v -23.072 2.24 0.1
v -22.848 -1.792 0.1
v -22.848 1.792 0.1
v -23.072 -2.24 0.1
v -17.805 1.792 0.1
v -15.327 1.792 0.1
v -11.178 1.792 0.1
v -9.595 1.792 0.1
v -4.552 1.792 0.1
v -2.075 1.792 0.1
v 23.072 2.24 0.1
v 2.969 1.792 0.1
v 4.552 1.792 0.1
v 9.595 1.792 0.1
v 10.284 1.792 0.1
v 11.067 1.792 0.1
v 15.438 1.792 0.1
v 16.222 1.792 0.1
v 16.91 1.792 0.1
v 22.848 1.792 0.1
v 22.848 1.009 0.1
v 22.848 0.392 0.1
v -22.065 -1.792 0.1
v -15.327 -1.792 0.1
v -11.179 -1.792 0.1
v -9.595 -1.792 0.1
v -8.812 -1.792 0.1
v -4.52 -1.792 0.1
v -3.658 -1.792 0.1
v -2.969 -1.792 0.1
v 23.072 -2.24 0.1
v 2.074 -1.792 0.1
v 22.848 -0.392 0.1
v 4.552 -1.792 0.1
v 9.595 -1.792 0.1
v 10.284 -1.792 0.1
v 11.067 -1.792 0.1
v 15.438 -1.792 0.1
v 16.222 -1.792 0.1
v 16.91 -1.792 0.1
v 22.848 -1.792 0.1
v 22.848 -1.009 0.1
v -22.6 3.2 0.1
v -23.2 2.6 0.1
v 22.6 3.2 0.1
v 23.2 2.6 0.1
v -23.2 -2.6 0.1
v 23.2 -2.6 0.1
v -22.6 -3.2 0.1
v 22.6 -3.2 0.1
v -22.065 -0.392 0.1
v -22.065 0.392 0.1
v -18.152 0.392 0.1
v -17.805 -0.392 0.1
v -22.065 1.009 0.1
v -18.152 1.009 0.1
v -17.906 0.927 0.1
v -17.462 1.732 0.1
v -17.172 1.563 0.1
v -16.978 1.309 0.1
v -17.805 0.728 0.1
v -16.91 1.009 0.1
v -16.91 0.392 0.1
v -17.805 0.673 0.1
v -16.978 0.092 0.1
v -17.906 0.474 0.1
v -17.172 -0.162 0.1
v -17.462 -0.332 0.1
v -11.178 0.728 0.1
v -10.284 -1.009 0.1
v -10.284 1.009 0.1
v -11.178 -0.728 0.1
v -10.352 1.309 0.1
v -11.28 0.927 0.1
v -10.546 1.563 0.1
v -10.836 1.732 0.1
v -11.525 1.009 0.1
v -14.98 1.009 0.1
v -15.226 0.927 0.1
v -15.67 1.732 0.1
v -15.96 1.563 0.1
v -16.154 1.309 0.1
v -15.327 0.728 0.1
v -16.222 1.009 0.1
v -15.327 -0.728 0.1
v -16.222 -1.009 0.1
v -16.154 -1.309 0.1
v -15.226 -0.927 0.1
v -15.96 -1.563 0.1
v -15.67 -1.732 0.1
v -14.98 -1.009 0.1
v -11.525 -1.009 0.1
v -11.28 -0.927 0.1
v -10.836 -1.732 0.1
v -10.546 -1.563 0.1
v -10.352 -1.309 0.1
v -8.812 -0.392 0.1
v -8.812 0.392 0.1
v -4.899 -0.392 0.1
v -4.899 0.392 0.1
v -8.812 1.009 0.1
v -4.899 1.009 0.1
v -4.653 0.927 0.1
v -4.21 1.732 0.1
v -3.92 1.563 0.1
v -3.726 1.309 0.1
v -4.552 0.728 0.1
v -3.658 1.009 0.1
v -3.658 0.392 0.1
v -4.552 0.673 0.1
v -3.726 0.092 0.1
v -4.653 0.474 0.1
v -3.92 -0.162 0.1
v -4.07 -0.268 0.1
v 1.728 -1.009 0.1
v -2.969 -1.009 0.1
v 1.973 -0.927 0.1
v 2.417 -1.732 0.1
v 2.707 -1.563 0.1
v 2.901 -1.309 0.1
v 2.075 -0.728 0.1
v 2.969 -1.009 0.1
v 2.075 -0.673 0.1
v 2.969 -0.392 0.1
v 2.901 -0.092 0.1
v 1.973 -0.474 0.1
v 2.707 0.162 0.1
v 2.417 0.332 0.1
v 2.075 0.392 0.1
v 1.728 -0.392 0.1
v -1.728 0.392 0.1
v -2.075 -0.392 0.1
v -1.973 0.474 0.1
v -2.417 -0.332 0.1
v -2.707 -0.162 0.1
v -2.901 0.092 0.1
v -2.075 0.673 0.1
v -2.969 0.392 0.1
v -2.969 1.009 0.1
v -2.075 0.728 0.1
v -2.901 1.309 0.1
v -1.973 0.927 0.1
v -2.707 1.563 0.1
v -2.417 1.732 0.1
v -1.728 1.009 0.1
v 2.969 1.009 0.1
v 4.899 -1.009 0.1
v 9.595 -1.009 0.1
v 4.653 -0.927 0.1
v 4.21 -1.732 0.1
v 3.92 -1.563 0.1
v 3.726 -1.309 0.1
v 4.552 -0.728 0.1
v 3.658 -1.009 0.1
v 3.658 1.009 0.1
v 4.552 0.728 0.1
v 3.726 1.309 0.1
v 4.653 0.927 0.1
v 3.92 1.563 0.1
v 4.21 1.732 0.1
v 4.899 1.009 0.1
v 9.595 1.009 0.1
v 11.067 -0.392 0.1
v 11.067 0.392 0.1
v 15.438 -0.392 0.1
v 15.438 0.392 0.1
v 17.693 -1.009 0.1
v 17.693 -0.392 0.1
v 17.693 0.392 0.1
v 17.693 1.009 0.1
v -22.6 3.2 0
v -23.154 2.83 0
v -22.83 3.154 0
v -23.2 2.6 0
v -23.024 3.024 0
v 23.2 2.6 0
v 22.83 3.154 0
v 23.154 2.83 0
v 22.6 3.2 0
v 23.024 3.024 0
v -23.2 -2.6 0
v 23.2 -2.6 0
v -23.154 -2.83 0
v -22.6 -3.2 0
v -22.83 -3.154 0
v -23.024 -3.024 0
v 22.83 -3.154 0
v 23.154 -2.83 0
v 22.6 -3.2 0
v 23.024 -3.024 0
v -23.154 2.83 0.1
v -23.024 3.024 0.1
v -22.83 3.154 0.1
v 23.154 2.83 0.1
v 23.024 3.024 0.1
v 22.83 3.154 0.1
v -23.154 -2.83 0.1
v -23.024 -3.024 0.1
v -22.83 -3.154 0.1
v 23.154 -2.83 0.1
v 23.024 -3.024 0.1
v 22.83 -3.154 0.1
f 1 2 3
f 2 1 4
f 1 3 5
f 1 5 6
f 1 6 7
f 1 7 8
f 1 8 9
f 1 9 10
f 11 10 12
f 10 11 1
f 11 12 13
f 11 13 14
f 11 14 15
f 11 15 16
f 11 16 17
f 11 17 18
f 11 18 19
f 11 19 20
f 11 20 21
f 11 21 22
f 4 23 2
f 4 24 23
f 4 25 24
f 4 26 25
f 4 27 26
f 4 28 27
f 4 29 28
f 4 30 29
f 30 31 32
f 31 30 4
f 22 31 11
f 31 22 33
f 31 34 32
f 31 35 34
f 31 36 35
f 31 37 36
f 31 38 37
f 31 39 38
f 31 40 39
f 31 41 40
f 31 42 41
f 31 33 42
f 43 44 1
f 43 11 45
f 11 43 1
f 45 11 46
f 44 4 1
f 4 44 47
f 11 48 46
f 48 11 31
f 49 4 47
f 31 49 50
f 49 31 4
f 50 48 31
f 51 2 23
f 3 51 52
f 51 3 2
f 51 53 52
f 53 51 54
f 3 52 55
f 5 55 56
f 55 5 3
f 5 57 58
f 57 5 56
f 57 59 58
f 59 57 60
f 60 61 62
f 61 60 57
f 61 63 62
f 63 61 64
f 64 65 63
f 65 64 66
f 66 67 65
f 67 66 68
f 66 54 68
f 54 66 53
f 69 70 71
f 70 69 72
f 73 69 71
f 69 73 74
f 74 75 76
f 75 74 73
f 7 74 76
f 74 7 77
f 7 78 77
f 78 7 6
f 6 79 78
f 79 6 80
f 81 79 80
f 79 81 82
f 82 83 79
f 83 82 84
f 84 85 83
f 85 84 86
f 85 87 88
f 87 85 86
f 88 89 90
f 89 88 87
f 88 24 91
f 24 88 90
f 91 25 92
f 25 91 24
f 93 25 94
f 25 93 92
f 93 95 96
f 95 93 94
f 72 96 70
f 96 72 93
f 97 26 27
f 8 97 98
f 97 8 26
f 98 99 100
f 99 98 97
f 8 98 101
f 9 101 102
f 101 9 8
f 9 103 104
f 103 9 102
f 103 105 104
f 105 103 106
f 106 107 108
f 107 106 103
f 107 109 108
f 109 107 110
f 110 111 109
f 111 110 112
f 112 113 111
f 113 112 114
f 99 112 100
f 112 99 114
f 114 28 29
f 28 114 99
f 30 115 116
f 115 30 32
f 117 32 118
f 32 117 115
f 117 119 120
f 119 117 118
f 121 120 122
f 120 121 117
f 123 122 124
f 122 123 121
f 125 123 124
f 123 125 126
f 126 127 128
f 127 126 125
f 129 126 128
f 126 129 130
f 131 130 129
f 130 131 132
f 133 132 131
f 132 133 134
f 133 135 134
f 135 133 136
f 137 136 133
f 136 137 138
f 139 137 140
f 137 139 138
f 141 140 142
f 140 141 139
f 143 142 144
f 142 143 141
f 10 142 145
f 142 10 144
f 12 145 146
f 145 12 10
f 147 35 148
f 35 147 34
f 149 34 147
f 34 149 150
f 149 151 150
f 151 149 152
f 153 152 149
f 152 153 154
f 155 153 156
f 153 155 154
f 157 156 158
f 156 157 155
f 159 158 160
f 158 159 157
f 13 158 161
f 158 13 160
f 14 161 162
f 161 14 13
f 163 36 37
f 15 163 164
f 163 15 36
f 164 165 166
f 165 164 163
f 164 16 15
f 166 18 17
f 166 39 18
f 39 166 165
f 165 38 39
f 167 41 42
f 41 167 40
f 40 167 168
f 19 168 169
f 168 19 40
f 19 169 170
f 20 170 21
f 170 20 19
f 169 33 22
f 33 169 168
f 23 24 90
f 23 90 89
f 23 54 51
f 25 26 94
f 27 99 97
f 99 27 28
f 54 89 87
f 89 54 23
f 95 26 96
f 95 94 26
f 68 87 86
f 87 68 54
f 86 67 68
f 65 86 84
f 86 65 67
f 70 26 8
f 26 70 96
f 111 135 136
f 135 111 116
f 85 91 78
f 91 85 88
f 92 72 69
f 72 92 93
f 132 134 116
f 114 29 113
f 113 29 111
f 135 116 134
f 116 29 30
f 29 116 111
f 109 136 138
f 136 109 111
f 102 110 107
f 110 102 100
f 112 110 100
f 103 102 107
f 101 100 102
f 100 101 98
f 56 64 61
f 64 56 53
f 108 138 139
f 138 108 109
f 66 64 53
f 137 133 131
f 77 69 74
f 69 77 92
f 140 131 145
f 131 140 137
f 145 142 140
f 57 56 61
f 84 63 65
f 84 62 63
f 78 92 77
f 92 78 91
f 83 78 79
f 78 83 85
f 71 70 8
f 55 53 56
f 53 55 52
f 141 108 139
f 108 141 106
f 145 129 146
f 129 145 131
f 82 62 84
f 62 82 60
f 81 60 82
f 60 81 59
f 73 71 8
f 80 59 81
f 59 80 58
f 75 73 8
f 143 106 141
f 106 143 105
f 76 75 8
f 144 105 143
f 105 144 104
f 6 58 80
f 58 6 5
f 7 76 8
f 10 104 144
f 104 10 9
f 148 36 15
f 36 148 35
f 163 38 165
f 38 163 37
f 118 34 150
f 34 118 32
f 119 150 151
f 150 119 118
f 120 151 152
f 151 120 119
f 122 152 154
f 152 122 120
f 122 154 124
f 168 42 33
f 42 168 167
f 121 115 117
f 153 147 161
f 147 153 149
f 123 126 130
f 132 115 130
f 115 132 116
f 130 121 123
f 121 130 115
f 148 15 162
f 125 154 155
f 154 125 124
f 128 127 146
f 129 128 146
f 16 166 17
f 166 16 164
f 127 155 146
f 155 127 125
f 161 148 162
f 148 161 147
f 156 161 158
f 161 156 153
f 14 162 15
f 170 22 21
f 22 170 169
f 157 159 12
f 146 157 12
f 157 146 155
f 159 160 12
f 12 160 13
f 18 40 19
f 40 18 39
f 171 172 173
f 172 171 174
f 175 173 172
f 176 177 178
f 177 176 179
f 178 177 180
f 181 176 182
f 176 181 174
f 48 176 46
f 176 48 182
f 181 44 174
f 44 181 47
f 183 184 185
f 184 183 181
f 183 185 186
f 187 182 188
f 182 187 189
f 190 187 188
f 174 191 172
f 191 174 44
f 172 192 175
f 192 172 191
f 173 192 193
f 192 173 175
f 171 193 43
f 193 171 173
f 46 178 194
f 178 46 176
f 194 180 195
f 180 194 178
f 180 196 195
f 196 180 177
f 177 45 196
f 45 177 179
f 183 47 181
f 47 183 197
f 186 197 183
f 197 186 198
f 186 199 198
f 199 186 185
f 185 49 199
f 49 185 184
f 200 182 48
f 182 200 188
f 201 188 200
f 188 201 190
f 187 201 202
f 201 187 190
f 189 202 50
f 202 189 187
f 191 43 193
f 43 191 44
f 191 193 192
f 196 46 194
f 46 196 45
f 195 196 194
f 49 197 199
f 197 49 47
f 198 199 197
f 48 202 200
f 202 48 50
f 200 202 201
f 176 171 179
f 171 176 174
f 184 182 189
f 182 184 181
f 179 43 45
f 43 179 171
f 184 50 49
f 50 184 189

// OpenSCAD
// file: s/6148328ps02.scad
use <../../lib.scad>
function ldraw_lib__s__6148328ps02() = [
// 0 ~Sticker  0.8 x  5.8 with Red "PORSCHE" on Black Background - Complementary faces
// 0 Name: s\6148328ps02.dat
// 0 Author: Massimo Maso [Sirio]
// 0 !LDRAW_ORG Subpart UPDATE 2024-05
// 0 !LICENSE Licensed under CC BY 4.0 : see CAreadme.txt
// 
// 0 BFC CERTIFY CCW
  [0,"BFC","CERTIFY"],
  [0,"BFC","CCW"],
// 
// 0 !HISTORY 2024-06-30 [OrionP] Official Update 2024-05
// 
// 
// 0 // Faces
// 3 16 -56.5 0 8 -58 0 6.5 -57.68 0 5.6
  [3,16,-56.5,0,8,-58,0,6.5,-57.68,0,5.6],
// 4 16 -56.5 0 8 -57.68 0 5.6 57.68 0 5.6 56.5 0 8
  [4,16,-56.5,0,8,-57.68,0,5.6,57.68,0,5.6,56.5,0,8],
// 3 16 56.5 0 8 57.68 0 5.6 58 0 6.5
  [3,16,56.5,0,8,57.68,0,5.6,58,0,6.5],
// 4 16 -58 0 6.5 -58 0 -6.5 -57.68 0 -5.6 -57.68 0 5.6
  [4,16,-58,0,6.5,-58,0,-6.5,-57.68,0,-5.6,-57.68,0,5.6],
// 4 16 58 0 6.5 57.68 0 5.6 57.68 0 -5.6 58 0 -6.5
  [4,16,58,0,6.5,57.68,0,5.6,57.68,0,-5.6,58,0,-6.5],
// 3 16 -56.5 0 -8 -57.68 0 -5.6 -58 0 -6.5
  [3,16,-56.5,0,-8,-57.68,0,-5.6,-58,0,-6.5],
// 4 16 -56.5 0 -8 56.5 0 -8 57.68 0 -5.6 -57.68 0 -5.6
  [4,16,-56.5,0,-8,56.5,0,-8,57.68,0,-5.6,-57.68,0,-5.6],
// 3 16 56.5 0 -8 58 0 -6.5 57.68 0 -5.6
  [3,16,56.5,0,-8,58,0,-6.5,57.68,0,-5.6],
];
module ldraw_lib__s__6148328ps02(step=0, col=false, unit=2/5, alt=false, line=0.2, solid=!$preview)
    makepoly(ldraw_lib__s__6148328ps02(), step=step, col=col, unit=unit, alt=alt, line=line, solid=solid);
ldraw_lib__s__6148328ps02(line=0.2);
// file: s/6148328ps01.scad
use <../../lib.scad>
function ldraw_lib__s__6148328ps01() = [
// 0 ~Sticker  0.8 x  5.8 with Red "PORSCHE" on Black Background - Outerbox for Logo Unscaled
// 0 Name: s\6148328ps01.dat
// 0 Author: Massimo Maso [Sirio]
// 0 !LDRAW_ORG Subpart UPDATE 2024-08
// 0 !LICENSE Licensed under CC BY 4.0 : see CAreadme.txt
// 
// 0 BFC CERTIFY CCW
  [0,"BFC","CERTIFY"],
  [0,"BFC","CCW"],
// 
// 0 !HISTORY 2023-10-31 [OrionP] Official Update 2023-05
// 0 !HISTORY 2024-07-21 [Sirio] Modified for change of logo primitive
// 0 !HISTORY 2024-09-30 [OrionP] Official Update 2024-08
// 
// 0 // Outerbox
// 4 16 -51.5 0 5 -51.5 0 -5 -51 0 -4 -51 0 4
  [4,16,-51.5,0,5,-51.5,0,-5,-51,0,-4,-51,0,4],
// 3 16 -51.5 0 5 -51 0 4 -39.7424 0 4
  [3,16,-51.5,0,5,-51,0,4,-39.7424,0,4],
// 3 16 -51.5 0 5 -39.7424 0 4 -34.2129 0 4
  [3,16,-51.5,0,5,-39.7424,0,4,-34.2129,0,4],
// 3 16 -51.5 0 5 -34.2129 0 4 -24.9513 0 4
  [3,16,-51.5,0,5,-34.2129,0,4,-24.9513,0,4],
// 3 16 -51.5 0 5 -24.9513 0 4 -21.4179 0 4
  [3,16,-51.5,0,5,-24.9513,0,4,-21.4179,0,4],
// 3 16 -51.5 0 5 -21.4179 0 4 -10.1603 0 4
  [3,16,-51.5,0,5,-21.4179,0,4,-10.1603,0,4],
// 3 16 -51.5 0 5 -10.1603 0 4 -4.6308 0 4
  [3,16,-51.5,0,5,-10.1603,0,4,-4.6308,0,4],
// 4 16 -51.5 0 5 -4.6308 0 4 6.6268 0 4 51.5 0 5
  [4,16,-51.5,0,5,-4.6308,0,4,6.6268,0,4,51.5,0,5],
// 3 16 51.5 0 5 6.6268 0 4 10.1603 0 4
  [3,16,51.5,0,5,6.6268,0,4,10.1603,0,4],
// 3 16 51.5 0 5 10.1603 0 4 21.4179 0 4
  [3,16,51.5,0,5,10.1603,0,4,21.4179,0,4],
// 3 16 51.5 0 5 21.4179 0 4 22.9553 0 4
  [3,16,51.5,0,5,21.4179,0,4,22.9553,0,4],
// 3 16 51.5 0 5 22.9553 0 4 24.7033 0 4
  [3,16,51.5,0,5,22.9553,0,4,24.7033,0,4],
// 3 16 51.5 0 5 24.7033 0 4 34.4609 0 4
  [3,16,51.5,0,5,24.7033,0,4,34.4609,0,4],
// 3 16 51.5 0 5 34.4609 0 4 36.2089 0 4
  [3,16,51.5,0,5,34.4609,0,4,36.2089,0,4],
// 3 16 51.5 0 5 36.2089 0 4 37.7464 0 4
  [3,16,51.5,0,5,36.2089,0,4,37.7464,0,4],
// 3 16 51.5 0 5 37.7464 0 4 51 0 4
  [3,16,51.5,0,5,37.7464,0,4,51,0,4],
// 3 16 51.5 0 5 51 0 4 51 0 2.252
  [3,16,51.5,0,5,51,0,4,51,0,2.252],
// 3 16 51.5 0 5 51 0 2.252 51 0 .874
  [3,16,51.5,0,5,51,0,2.252,51,0,.874],
// 3 16 -51.5 0 -5 -49.252 0 -4 -51 0 -4
  [3,16,-51.5,0,-5,-49.252,0,-4,-51,0,-4],
// 3 16 -51.5 0 -5 -34.212 0 -4 -49.252 0 -4
  [3,16,-51.5,0,-5,-34.212,0,-4,-49.252,0,-4],
// 3 16 -51.5 0 -5 -24.9522 0 -4 -34.212 0 -4
  [3,16,-51.5,0,-5,-24.9522,0,-4,-34.212,0,-4],
// 3 16 -51.5 0 -5 -21.4179 0 -4 -24.9522 0 -4
  [3,16,-51.5,0,-5,-21.4179,0,-4,-24.9522,0,-4],
// 3 16 -51.5 0 -5 -19.6699 0 -4 -21.4179 0 -4
  [3,16,-51.5,0,-5,-19.6699,0,-4,-21.4179,0,-4],
// 3 16 -51.5 0 -5 -10.0889 0 -4 -19.6699 0 -4
  [3,16,-51.5,0,-5,-10.0889,0,-4,-19.6699,0,-4],
// 3 16 -51.5 0 -5 -8.1643 0 -4 -10.0889 0 -4
  [3,16,-51.5,0,-5,-8.1643,0,-4,-10.0889,0,-4],
// 3 16 -51.5 0 -5 -6.6268 0 -4 -8.1643 0 -4
  [3,16,-51.5,0,-5,-6.6268,0,-4,-8.1643,0,-4],
// 4 16 -51.5 0 -5 51.5 0 -5 4.6299 0 -4 -6.6268 0 -4
  [4,16,-51.5,0,-5,51.5,0,-5,4.6299,0,-4,-6.6268,0,-4],
// 4 16 51.5 0 5 51 0 .874 51 0 -.874 51.5 0 -5
  [4,16,51.5,0,5,51,0,.874,51,0,-.874,51.5,0,-5],
// 3 16 51.5 0 -5 10.1612 0 -4 4.6299 0 -4
  [3,16,51.5,0,-5,10.1612,0,-4,4.6299,0,-4],
// 3 16 51.5 0 -5 21.4179 0 -4 10.1612 0 -4
  [3,16,51.5,0,-5,21.4179,0,-4,10.1612,0,-4],
// 3 16 51.5 0 -5 22.9553 0 -4 21.4179 0 -4
  [3,16,51.5,0,-5,22.9553,0,-4,21.4179,0,-4],
// 3 16 51.5 0 -5 24.7033 0 -4 22.9553 0 -4
  [3,16,51.5,0,-5,24.7033,0,-4,22.9553,0,-4],
// 3 16 51.5 0 -5 34.4609 0 -4 24.7033 0 -4
  [3,16,51.5,0,-5,34.4609,0,-4,24.7033,0,-4],
// 3 16 51.5 0 -5 36.2089 0 -4 34.4609 0 -4
  [3,16,51.5,0,-5,36.2089,0,-4,34.4609,0,-4],
// 3 16 51.5 0 -5 37.7464 0 -4 36.2089 0 -4
  [3,16,51.5,0,-5,37.7464,0,-4,36.2089,0,-4],
// 3 16 51.5 0 -5 51 0 -4 37.7464 0 -4
  [3,16,51.5,0,-5,51,0,-4,37.7464,0,-4],
// 3 16 51.5 0 -5 51 0 -2.252 51 0 -4
  [3,16,51.5,0,-5,51,0,-2.252,51,0,-4],
// 3 16 51.5 0 -5 51 0 -.874 51 0 -2.252
  [3,16,51.5,0,-5,51,0,-.874,51,0,-2.252],
];
module ldraw_lib__s__6148328ps01(step=0, col=false, unit=2/5, alt=false, line=0.2, solid=!$preview)
    makepoly(ldraw_lib__s__6148328ps01(), step=step, col=col, unit=unit, alt=alt, line=line, solid=solid);
ldraw_lib__s__6148328ps01(line=0.2);
// file: ../p/box3u12.scad
use <../lib.scad>
function ldraw_lib__box3u12() = [
// 0 Box with 3 Parallel Faces without Any Edges
// 0 Name: box3u12.dat
// 0 Author: J.C. Tchang [tchang]
// 0 !LDRAW_ORG Primitive UPDATE 2014-02
// 0 !LICENSE Licensed under CC BY 4.0 : see CAreadme.txt
// 
// 0 BFC CERTIFY CCW
  [0,"BFC","CERTIFY"],
  [0,"BFC","CCW"],
// 
// 0 !HISTORY 2014-12-23 [PTadmin] Official Update 2014-02
// 
// 
// 4 16 -1 1 1 1 1 1 1 1 -1 -1 1 -1
  [4,16,-1,1,1,1,1,1,1,1,-1,-1,1,-1],
// 4 16 -1 1 1 -1 0 1 1 0 1 1 1 1
  [4,16,-1,1,1,-1,0,1,1,0,1,1,1,1],
// 4 16 1 1 -1 1 0 -1 -1 0 -1 -1 1 -1
  [4,16,1,1,-1,1,0,-1,-1,0,-1,-1,1,-1],
];
module ldraw_lib__box3u12(step=0, col=false, unit=2/5, alt=false, line=0.2, solid=!$preview)
    makepoly(ldraw_lib__box3u12(), step=step, col=col, unit=unit, alt=alt, line=line, solid=solid);
ldraw_lib__box3u12(line=0.2);
// file: ../p/1-4cyli.scad
use <../lib.scad>
function ldraw_lib__1_4cyli() = [
// 0 Cylinder 0.25
// 0 Name: 1-4cyli.dat
// 0 Author: James Jessiman
// 0 !LDRAW_ORG Primitive UPDATE 2012-01
// 0 !LICENSE Licensed under CC BY 4.0 : see CAreadme.txt
// 
// 0 BFC CERTIFY CCW
  [0,"BFC","CERTIFY"],
  [0,"BFC","CCW"],
// 
// 0 !HISTORY 2002-03-23 [sbliss] Added BFC statement.
// 0 !HISTORY 2002-04-25 [PTadmin] Official Update 2002-02
// 0 !HISTORY 2007-06-22 [PTadmin] Header formatted for Contributor Agreement
// 0 !HISTORY 2008-07-01 [PTadmin] Official Update 2008-01
// 0 !HISTORY 2012-02-16 [Philo] Changed to CCW
// 0 !HISTORY 2012-03-30 [PTadmin] Official Update 2012-01
// 
// 
// 4 16 1 1 0 0.9239 1 0.3827 0.9239 0 0.3827 1 0 0
  [4,16,1,1,0,0.9239,1,0.3827,0.9239,0,0.3827,1,0,0],
// 5 24 1 0 0 1 1 0 0.9239 0 0.3827 1 0 -1
  [5,24,1,0,0,1,1,0,0.9239,0,0.3827,1,0,-1],
// 4 16 0.9239 1 0.3827 0.7071 1 0.7071 0.7071 0 0.7071 0.9239 0 0.3827
  [4,16,0.9239,1,0.3827,0.7071,1,0.7071,0.7071,0,0.7071,0.9239,0,0.3827],
// 5 24 0.9239 0 0.3827 0.9239 1 0.3827 0.7071 0 0.7071 1 0 0
  [5,24,0.9239,0,0.3827,0.9239,1,0.3827,0.7071,0,0.7071,1,0,0],
// 4 16 0.7071 1 0.7071 0.3827 1 0.9239 0.3827 0 0.9239 0.7071 0 0.7071
  [4,16,0.7071,1,0.7071,0.3827,1,0.9239,0.3827,0,0.9239,0.7071,0,0.7071],
// 5 24 0.7071 0 0.7071 0.7071 1 0.7071 0.3827 0 0.9239 0.9239 0 0.3827
  [5,24,0.7071,0,0.7071,0.7071,1,0.7071,0.3827,0,0.9239,0.9239,0,0.3827],
// 4 16 0.3827 1 0.9239 0 1 1 0 0 1 0.3827 0 0.9239
  [4,16,0.3827,1,0.9239,0,1,1,0,0,1,0.3827,0,0.9239],
// 5 24 0.3827 0 0.9239 0.3827 1 0.9239 0 0 1 0.7071 0 0.7071
  [5,24,0.3827,0,0.9239,0.3827,1,0.9239,0,0,1,0.7071,0,0.7071],
// 5 24 0 0 1 0 1 1 0.3827 0 0.9239 -1 0 1
  [5,24,0,0,1,0,1,1,0.3827,0,0.9239,-1,0,1],
];
module ldraw_lib__1_4cyli(step=0, col=false, unit=2/5, alt=false, line=0.2, solid=!$preview)
    makepoly(ldraw_lib__1_4cyli(), step=step, col=col, unit=unit, alt=alt, line=line, solid=solid);
ldraw_lib__1_4cyli(line=0.2);
// file: ../p/1-4chrd.scad
use <../lib.scad>
function ldraw_lib__1_4chrd() = [
// 0 Chord 0.25
// 0 Name: 1-4chrd.dat
// 0 Author: Max Martin Richter [MMR1988]
// 0 !LDRAW_ORG Primitive UPDATE 2023-05
// 0 !LICENSE Licensed under CC BY 4.0 : see CAreadme.txt
// 
// 0 BFC CERTIFY CCW
  [0,"BFC","CERTIFY"],
  [0,"BFC","CCW"],
// 
// 0 !HISTORY 2004-04-22 [PTadmin] Official Update 2004-02
// 0 !HISTORY 2007-10-09 [PTadmin] Header formatted for Contributor Agreement
// 0 !HISTORY 2008-07-01 [PTadmin] Official Update 2008-01
// 0 !HISTORY 2012-08-02 [MMR1988] Re-creation with PrimGen2 and Rectifier
// 0 !HISTORY 2012-08-09 [PTadmin] Official Update 2012-02
// 0 !HISTORY 2023-10-27 [OrionP] Change author to MMR1988 from hafhead
// 0 !HISTORY 2023-10-31 [OrionP] Official Update 2023-05
// 
// 4 16 0.9239 0 0.3827 0.3827 0 0.9239 0 0 1 1 0 0
  [4,16,0.9239,0,0.3827,0.3827,0,0.9239,0,0,1,1,0,0],
// 3 16 0.7071 0 0.7071 0.3827 0 0.9239 0.9239 0 0.3827
  [3,16,0.7071,0,0.7071,0.3827,0,0.9239,0.9239,0,0.3827],
];
module ldraw_lib__1_4chrd(step=0, col=false, unit=2/5, alt=false, line=0.2, solid=!$preview)
    makepoly(ldraw_lib__1_4chrd(), step=step, col=col, unit=unit, alt=alt, line=line, solid=solid);
ldraw_lib__1_4chrd(line=0.2);
// main file
use <../lib.scad>
use <../p/1-4chrd.scad>
use <../p/1-4cyli.scad>
use <../p/box3u12.scad>
use <../p/logo-porsche-box.scad>
use <../p/logo-porsche-text.scad>
use <s/6148328ps01.scad>
use <s/6148328ps02.scad>
function ldraw_lib__6221655b() = [
// 0 Sticker  0.8 x  5.8 with Red "PORSCHE" on Black Background
// 0 Name: 6221655b.dat
// 0 Author: Massimo Maso [Sirio]
// 0 !LDRAW_ORG Part UPDATE 2024-09
// 0 !LICENSE Licensed under CC BY 4.0 : see CAreadme.txt
// 
// 0 BFC CERTIFY CCW
  [0,"BFC","CERTIFY"],
  [0,"BFC","CCW"],
// 
// 0 !KEYWORDS 3.0, 911 RSR, Set 75888, Speed Champions, Turbo
// 
// 0 !HISTORY 2024-10-27 [OrionP] Official Update 2024-09
// 
// 0 // Subpart
// 1 0 0 -.25 0 1.12 0 0 0 1 0 0 0 1.12 s\6148328ps01.dat
  [1,0,0,-.25,0,1.12,0,0,0,1,0,0,0,1.12, ldraw_lib__s__6148328ps01()],
// 1 0 0 -.25 0 1 0 0 0 1 0 0 0 1 s\6148328ps02.dat
  [1,0,0,-.25,0,1,0,0,0,1,0,0,0,1, ldraw_lib__s__6148328ps02()],
// 0 // Logo primitive
// 1 4 0 -.25 0 1.12 0 0 0 1 0 0 0 1.12 logo-porsche-text.dat
  [1,4,0,-.25,0,1.12,0,0,0,1,0,0,0,1.12, ldraw_lib__logo_porsche_text()],
// 1 0 0 -.25 0 1.12 0 0 0 1 0 0 0 1.12 logo-porsche-box.dat
  [1,0,0,-.25,0,1.12,0,0,0,1,0,0,0,1.12, ldraw_lib__logo_porsche_box()],
// 0 // Primitives
// 1 16 -56.5 0 6.5 -1.5 0 0 0 -1 0 0 0 1.5 1-4chrd.dat
  [1,16,-56.5,0,6.5,-1.5,0,0,0,-1,0,0,0,1.5, ldraw_lib__1_4chrd()],
// 1 16 56.5 0 6.5 1.5 0 0 0 -1 0 0 0 1.5 1-4chrd.dat
  [1,16,56.5,0,6.5,1.5,0,0,0,-1,0,0,0,1.5, ldraw_lib__1_4chrd()],
// 1 16 0 -.25 0 0 0 58 0 .25 0 6.5 0 0 box3u12.dat
  [1,16,0,-.25,0,0,0,58,0,.25,0,6.5,0,0, ldraw_lib__box3u12()],
// 1 16 -56.5 0 -6.5 -1.5 0 0 0 -1 0 0 0 -1.5 1-4chrd.dat
  [1,16,-56.5,0,-6.5,-1.5,0,0,0,-1,0,0,0,-1.5, ldraw_lib__1_4chrd()],
// 1 16 56.5 0 -6.5 1.5 0 0 0 -1 0 0 0 -1.5 1-4chrd.dat
  [1,16,56.5,0,-6.5,1.5,0,0,0,-1,0,0,0,-1.5, ldraw_lib__1_4chrd()],
// 1 16 -56.5 0 6.5 -1.5 0 0 0 -.25 0 0 0 1.5 1-4cyli.dat
  [1,16,-56.5,0,6.5,-1.5,0,0,0,-.25,0,0,0,1.5, ldraw_lib__1_4cyli()],
// 1 16 56.5 0 6.5 1.5 0 0 0 -.25 0 0 0 1.5 1-4cyli.dat
  [1,16,56.5,0,6.5,1.5,0,0,0,-.25,0,0,0,1.5, ldraw_lib__1_4cyli()],
// 1 16 -56.5 0 -6.5 -1.5 0 0 0 -.25 0 0 0 -1.5 1-4cyli.dat
  [1,16,-56.5,0,-6.5,-1.5,0,0,0,-.25,0,0,0,-1.5, ldraw_lib__1_4cyli()],
// 1 16 56.5 0 -6.5 1.5 0 0 0 -.25 0 0 0 -1.5 1-4cyli.dat
  [1,16,56.5,0,-6.5,1.5,0,0,0,-.25,0,0,0,-1.5, ldraw_lib__1_4cyli()],
// 1 0 -56.5 -.25 6.5 -1.5 0 0 0 1 0 0 0 1.5 1-4chrd.dat
  [1,0,-56.5,-.25,6.5,-1.5,0,0,0,1,0,0,0,1.5, ldraw_lib__1_4chrd()],
// 1 0 56.5 -.25 6.5 1.5 0 0 0 1 0 0 0 1.5 1-4chrd.dat
  [1,0,56.5,-.25,6.5,1.5,0,0,0,1,0,0,0,1.5, ldraw_lib__1_4chrd()],
// 1 0 -56.5 -.25 -6.5 -1.5 0 0 0 1 0 0 0 -1.5 1-4chrd.dat
  [1,0,-56.5,-.25,-6.5,-1.5,0,0,0,1,0,0,0,-1.5, ldraw_lib__1_4chrd()],
// 1 0 56.5 -.25 -6.5 1.5 0 0 0 1 0 0 0 -1.5 1-4chrd.dat
  [1,0,56.5,-.25,-6.5,1.5,0,0,0,1,0,0,0,-1.5, ldraw_lib__1_4chrd()],
// 0 // Bottom faces
// 4 16 56.5 0 8 58 0 6.5 -58 0 6.5 -56.5 0 8
  [4,16,56.5,0,8,58,0,6.5,-58,0,6.5,-56.5,0,8],
// 4 16 56.5 0 -8 -56.5 0 -8 -58 0 -6.5 58 0 -6.5
  [4,16,56.5,0,-8,-56.5,0,-8,-58,0,-6.5,58,0,-6.5],
// 0 // Lateral faces
// 4 16 -56.5 0 8 -56.5 -.25 8 56.5 -.25 8 56.5 0 8
  [4,16,-56.5,0,8,-56.5,-.25,8,56.5,-.25,8,56.5,0,8],
// 4 16 -56.5 0 -8 56.5 0 -8 56.5 -.25 -8 -56.5 -.25 -8
  [4,16,-56.5,0,-8,56.5,0,-8,56.5,-.25,-8,-56.5,-.25,-8],
];
module ldraw_lib__6221655b(step=0, col=false, unit=2/5, alt=false, line=0.2, solid=!$preview)
    makepoly(ldraw_lib__6221655b(), step=step, col=col, unit=unit, alt=alt, line=line, solid=solid);
ldraw_lib__6221655b(line=0.2);
